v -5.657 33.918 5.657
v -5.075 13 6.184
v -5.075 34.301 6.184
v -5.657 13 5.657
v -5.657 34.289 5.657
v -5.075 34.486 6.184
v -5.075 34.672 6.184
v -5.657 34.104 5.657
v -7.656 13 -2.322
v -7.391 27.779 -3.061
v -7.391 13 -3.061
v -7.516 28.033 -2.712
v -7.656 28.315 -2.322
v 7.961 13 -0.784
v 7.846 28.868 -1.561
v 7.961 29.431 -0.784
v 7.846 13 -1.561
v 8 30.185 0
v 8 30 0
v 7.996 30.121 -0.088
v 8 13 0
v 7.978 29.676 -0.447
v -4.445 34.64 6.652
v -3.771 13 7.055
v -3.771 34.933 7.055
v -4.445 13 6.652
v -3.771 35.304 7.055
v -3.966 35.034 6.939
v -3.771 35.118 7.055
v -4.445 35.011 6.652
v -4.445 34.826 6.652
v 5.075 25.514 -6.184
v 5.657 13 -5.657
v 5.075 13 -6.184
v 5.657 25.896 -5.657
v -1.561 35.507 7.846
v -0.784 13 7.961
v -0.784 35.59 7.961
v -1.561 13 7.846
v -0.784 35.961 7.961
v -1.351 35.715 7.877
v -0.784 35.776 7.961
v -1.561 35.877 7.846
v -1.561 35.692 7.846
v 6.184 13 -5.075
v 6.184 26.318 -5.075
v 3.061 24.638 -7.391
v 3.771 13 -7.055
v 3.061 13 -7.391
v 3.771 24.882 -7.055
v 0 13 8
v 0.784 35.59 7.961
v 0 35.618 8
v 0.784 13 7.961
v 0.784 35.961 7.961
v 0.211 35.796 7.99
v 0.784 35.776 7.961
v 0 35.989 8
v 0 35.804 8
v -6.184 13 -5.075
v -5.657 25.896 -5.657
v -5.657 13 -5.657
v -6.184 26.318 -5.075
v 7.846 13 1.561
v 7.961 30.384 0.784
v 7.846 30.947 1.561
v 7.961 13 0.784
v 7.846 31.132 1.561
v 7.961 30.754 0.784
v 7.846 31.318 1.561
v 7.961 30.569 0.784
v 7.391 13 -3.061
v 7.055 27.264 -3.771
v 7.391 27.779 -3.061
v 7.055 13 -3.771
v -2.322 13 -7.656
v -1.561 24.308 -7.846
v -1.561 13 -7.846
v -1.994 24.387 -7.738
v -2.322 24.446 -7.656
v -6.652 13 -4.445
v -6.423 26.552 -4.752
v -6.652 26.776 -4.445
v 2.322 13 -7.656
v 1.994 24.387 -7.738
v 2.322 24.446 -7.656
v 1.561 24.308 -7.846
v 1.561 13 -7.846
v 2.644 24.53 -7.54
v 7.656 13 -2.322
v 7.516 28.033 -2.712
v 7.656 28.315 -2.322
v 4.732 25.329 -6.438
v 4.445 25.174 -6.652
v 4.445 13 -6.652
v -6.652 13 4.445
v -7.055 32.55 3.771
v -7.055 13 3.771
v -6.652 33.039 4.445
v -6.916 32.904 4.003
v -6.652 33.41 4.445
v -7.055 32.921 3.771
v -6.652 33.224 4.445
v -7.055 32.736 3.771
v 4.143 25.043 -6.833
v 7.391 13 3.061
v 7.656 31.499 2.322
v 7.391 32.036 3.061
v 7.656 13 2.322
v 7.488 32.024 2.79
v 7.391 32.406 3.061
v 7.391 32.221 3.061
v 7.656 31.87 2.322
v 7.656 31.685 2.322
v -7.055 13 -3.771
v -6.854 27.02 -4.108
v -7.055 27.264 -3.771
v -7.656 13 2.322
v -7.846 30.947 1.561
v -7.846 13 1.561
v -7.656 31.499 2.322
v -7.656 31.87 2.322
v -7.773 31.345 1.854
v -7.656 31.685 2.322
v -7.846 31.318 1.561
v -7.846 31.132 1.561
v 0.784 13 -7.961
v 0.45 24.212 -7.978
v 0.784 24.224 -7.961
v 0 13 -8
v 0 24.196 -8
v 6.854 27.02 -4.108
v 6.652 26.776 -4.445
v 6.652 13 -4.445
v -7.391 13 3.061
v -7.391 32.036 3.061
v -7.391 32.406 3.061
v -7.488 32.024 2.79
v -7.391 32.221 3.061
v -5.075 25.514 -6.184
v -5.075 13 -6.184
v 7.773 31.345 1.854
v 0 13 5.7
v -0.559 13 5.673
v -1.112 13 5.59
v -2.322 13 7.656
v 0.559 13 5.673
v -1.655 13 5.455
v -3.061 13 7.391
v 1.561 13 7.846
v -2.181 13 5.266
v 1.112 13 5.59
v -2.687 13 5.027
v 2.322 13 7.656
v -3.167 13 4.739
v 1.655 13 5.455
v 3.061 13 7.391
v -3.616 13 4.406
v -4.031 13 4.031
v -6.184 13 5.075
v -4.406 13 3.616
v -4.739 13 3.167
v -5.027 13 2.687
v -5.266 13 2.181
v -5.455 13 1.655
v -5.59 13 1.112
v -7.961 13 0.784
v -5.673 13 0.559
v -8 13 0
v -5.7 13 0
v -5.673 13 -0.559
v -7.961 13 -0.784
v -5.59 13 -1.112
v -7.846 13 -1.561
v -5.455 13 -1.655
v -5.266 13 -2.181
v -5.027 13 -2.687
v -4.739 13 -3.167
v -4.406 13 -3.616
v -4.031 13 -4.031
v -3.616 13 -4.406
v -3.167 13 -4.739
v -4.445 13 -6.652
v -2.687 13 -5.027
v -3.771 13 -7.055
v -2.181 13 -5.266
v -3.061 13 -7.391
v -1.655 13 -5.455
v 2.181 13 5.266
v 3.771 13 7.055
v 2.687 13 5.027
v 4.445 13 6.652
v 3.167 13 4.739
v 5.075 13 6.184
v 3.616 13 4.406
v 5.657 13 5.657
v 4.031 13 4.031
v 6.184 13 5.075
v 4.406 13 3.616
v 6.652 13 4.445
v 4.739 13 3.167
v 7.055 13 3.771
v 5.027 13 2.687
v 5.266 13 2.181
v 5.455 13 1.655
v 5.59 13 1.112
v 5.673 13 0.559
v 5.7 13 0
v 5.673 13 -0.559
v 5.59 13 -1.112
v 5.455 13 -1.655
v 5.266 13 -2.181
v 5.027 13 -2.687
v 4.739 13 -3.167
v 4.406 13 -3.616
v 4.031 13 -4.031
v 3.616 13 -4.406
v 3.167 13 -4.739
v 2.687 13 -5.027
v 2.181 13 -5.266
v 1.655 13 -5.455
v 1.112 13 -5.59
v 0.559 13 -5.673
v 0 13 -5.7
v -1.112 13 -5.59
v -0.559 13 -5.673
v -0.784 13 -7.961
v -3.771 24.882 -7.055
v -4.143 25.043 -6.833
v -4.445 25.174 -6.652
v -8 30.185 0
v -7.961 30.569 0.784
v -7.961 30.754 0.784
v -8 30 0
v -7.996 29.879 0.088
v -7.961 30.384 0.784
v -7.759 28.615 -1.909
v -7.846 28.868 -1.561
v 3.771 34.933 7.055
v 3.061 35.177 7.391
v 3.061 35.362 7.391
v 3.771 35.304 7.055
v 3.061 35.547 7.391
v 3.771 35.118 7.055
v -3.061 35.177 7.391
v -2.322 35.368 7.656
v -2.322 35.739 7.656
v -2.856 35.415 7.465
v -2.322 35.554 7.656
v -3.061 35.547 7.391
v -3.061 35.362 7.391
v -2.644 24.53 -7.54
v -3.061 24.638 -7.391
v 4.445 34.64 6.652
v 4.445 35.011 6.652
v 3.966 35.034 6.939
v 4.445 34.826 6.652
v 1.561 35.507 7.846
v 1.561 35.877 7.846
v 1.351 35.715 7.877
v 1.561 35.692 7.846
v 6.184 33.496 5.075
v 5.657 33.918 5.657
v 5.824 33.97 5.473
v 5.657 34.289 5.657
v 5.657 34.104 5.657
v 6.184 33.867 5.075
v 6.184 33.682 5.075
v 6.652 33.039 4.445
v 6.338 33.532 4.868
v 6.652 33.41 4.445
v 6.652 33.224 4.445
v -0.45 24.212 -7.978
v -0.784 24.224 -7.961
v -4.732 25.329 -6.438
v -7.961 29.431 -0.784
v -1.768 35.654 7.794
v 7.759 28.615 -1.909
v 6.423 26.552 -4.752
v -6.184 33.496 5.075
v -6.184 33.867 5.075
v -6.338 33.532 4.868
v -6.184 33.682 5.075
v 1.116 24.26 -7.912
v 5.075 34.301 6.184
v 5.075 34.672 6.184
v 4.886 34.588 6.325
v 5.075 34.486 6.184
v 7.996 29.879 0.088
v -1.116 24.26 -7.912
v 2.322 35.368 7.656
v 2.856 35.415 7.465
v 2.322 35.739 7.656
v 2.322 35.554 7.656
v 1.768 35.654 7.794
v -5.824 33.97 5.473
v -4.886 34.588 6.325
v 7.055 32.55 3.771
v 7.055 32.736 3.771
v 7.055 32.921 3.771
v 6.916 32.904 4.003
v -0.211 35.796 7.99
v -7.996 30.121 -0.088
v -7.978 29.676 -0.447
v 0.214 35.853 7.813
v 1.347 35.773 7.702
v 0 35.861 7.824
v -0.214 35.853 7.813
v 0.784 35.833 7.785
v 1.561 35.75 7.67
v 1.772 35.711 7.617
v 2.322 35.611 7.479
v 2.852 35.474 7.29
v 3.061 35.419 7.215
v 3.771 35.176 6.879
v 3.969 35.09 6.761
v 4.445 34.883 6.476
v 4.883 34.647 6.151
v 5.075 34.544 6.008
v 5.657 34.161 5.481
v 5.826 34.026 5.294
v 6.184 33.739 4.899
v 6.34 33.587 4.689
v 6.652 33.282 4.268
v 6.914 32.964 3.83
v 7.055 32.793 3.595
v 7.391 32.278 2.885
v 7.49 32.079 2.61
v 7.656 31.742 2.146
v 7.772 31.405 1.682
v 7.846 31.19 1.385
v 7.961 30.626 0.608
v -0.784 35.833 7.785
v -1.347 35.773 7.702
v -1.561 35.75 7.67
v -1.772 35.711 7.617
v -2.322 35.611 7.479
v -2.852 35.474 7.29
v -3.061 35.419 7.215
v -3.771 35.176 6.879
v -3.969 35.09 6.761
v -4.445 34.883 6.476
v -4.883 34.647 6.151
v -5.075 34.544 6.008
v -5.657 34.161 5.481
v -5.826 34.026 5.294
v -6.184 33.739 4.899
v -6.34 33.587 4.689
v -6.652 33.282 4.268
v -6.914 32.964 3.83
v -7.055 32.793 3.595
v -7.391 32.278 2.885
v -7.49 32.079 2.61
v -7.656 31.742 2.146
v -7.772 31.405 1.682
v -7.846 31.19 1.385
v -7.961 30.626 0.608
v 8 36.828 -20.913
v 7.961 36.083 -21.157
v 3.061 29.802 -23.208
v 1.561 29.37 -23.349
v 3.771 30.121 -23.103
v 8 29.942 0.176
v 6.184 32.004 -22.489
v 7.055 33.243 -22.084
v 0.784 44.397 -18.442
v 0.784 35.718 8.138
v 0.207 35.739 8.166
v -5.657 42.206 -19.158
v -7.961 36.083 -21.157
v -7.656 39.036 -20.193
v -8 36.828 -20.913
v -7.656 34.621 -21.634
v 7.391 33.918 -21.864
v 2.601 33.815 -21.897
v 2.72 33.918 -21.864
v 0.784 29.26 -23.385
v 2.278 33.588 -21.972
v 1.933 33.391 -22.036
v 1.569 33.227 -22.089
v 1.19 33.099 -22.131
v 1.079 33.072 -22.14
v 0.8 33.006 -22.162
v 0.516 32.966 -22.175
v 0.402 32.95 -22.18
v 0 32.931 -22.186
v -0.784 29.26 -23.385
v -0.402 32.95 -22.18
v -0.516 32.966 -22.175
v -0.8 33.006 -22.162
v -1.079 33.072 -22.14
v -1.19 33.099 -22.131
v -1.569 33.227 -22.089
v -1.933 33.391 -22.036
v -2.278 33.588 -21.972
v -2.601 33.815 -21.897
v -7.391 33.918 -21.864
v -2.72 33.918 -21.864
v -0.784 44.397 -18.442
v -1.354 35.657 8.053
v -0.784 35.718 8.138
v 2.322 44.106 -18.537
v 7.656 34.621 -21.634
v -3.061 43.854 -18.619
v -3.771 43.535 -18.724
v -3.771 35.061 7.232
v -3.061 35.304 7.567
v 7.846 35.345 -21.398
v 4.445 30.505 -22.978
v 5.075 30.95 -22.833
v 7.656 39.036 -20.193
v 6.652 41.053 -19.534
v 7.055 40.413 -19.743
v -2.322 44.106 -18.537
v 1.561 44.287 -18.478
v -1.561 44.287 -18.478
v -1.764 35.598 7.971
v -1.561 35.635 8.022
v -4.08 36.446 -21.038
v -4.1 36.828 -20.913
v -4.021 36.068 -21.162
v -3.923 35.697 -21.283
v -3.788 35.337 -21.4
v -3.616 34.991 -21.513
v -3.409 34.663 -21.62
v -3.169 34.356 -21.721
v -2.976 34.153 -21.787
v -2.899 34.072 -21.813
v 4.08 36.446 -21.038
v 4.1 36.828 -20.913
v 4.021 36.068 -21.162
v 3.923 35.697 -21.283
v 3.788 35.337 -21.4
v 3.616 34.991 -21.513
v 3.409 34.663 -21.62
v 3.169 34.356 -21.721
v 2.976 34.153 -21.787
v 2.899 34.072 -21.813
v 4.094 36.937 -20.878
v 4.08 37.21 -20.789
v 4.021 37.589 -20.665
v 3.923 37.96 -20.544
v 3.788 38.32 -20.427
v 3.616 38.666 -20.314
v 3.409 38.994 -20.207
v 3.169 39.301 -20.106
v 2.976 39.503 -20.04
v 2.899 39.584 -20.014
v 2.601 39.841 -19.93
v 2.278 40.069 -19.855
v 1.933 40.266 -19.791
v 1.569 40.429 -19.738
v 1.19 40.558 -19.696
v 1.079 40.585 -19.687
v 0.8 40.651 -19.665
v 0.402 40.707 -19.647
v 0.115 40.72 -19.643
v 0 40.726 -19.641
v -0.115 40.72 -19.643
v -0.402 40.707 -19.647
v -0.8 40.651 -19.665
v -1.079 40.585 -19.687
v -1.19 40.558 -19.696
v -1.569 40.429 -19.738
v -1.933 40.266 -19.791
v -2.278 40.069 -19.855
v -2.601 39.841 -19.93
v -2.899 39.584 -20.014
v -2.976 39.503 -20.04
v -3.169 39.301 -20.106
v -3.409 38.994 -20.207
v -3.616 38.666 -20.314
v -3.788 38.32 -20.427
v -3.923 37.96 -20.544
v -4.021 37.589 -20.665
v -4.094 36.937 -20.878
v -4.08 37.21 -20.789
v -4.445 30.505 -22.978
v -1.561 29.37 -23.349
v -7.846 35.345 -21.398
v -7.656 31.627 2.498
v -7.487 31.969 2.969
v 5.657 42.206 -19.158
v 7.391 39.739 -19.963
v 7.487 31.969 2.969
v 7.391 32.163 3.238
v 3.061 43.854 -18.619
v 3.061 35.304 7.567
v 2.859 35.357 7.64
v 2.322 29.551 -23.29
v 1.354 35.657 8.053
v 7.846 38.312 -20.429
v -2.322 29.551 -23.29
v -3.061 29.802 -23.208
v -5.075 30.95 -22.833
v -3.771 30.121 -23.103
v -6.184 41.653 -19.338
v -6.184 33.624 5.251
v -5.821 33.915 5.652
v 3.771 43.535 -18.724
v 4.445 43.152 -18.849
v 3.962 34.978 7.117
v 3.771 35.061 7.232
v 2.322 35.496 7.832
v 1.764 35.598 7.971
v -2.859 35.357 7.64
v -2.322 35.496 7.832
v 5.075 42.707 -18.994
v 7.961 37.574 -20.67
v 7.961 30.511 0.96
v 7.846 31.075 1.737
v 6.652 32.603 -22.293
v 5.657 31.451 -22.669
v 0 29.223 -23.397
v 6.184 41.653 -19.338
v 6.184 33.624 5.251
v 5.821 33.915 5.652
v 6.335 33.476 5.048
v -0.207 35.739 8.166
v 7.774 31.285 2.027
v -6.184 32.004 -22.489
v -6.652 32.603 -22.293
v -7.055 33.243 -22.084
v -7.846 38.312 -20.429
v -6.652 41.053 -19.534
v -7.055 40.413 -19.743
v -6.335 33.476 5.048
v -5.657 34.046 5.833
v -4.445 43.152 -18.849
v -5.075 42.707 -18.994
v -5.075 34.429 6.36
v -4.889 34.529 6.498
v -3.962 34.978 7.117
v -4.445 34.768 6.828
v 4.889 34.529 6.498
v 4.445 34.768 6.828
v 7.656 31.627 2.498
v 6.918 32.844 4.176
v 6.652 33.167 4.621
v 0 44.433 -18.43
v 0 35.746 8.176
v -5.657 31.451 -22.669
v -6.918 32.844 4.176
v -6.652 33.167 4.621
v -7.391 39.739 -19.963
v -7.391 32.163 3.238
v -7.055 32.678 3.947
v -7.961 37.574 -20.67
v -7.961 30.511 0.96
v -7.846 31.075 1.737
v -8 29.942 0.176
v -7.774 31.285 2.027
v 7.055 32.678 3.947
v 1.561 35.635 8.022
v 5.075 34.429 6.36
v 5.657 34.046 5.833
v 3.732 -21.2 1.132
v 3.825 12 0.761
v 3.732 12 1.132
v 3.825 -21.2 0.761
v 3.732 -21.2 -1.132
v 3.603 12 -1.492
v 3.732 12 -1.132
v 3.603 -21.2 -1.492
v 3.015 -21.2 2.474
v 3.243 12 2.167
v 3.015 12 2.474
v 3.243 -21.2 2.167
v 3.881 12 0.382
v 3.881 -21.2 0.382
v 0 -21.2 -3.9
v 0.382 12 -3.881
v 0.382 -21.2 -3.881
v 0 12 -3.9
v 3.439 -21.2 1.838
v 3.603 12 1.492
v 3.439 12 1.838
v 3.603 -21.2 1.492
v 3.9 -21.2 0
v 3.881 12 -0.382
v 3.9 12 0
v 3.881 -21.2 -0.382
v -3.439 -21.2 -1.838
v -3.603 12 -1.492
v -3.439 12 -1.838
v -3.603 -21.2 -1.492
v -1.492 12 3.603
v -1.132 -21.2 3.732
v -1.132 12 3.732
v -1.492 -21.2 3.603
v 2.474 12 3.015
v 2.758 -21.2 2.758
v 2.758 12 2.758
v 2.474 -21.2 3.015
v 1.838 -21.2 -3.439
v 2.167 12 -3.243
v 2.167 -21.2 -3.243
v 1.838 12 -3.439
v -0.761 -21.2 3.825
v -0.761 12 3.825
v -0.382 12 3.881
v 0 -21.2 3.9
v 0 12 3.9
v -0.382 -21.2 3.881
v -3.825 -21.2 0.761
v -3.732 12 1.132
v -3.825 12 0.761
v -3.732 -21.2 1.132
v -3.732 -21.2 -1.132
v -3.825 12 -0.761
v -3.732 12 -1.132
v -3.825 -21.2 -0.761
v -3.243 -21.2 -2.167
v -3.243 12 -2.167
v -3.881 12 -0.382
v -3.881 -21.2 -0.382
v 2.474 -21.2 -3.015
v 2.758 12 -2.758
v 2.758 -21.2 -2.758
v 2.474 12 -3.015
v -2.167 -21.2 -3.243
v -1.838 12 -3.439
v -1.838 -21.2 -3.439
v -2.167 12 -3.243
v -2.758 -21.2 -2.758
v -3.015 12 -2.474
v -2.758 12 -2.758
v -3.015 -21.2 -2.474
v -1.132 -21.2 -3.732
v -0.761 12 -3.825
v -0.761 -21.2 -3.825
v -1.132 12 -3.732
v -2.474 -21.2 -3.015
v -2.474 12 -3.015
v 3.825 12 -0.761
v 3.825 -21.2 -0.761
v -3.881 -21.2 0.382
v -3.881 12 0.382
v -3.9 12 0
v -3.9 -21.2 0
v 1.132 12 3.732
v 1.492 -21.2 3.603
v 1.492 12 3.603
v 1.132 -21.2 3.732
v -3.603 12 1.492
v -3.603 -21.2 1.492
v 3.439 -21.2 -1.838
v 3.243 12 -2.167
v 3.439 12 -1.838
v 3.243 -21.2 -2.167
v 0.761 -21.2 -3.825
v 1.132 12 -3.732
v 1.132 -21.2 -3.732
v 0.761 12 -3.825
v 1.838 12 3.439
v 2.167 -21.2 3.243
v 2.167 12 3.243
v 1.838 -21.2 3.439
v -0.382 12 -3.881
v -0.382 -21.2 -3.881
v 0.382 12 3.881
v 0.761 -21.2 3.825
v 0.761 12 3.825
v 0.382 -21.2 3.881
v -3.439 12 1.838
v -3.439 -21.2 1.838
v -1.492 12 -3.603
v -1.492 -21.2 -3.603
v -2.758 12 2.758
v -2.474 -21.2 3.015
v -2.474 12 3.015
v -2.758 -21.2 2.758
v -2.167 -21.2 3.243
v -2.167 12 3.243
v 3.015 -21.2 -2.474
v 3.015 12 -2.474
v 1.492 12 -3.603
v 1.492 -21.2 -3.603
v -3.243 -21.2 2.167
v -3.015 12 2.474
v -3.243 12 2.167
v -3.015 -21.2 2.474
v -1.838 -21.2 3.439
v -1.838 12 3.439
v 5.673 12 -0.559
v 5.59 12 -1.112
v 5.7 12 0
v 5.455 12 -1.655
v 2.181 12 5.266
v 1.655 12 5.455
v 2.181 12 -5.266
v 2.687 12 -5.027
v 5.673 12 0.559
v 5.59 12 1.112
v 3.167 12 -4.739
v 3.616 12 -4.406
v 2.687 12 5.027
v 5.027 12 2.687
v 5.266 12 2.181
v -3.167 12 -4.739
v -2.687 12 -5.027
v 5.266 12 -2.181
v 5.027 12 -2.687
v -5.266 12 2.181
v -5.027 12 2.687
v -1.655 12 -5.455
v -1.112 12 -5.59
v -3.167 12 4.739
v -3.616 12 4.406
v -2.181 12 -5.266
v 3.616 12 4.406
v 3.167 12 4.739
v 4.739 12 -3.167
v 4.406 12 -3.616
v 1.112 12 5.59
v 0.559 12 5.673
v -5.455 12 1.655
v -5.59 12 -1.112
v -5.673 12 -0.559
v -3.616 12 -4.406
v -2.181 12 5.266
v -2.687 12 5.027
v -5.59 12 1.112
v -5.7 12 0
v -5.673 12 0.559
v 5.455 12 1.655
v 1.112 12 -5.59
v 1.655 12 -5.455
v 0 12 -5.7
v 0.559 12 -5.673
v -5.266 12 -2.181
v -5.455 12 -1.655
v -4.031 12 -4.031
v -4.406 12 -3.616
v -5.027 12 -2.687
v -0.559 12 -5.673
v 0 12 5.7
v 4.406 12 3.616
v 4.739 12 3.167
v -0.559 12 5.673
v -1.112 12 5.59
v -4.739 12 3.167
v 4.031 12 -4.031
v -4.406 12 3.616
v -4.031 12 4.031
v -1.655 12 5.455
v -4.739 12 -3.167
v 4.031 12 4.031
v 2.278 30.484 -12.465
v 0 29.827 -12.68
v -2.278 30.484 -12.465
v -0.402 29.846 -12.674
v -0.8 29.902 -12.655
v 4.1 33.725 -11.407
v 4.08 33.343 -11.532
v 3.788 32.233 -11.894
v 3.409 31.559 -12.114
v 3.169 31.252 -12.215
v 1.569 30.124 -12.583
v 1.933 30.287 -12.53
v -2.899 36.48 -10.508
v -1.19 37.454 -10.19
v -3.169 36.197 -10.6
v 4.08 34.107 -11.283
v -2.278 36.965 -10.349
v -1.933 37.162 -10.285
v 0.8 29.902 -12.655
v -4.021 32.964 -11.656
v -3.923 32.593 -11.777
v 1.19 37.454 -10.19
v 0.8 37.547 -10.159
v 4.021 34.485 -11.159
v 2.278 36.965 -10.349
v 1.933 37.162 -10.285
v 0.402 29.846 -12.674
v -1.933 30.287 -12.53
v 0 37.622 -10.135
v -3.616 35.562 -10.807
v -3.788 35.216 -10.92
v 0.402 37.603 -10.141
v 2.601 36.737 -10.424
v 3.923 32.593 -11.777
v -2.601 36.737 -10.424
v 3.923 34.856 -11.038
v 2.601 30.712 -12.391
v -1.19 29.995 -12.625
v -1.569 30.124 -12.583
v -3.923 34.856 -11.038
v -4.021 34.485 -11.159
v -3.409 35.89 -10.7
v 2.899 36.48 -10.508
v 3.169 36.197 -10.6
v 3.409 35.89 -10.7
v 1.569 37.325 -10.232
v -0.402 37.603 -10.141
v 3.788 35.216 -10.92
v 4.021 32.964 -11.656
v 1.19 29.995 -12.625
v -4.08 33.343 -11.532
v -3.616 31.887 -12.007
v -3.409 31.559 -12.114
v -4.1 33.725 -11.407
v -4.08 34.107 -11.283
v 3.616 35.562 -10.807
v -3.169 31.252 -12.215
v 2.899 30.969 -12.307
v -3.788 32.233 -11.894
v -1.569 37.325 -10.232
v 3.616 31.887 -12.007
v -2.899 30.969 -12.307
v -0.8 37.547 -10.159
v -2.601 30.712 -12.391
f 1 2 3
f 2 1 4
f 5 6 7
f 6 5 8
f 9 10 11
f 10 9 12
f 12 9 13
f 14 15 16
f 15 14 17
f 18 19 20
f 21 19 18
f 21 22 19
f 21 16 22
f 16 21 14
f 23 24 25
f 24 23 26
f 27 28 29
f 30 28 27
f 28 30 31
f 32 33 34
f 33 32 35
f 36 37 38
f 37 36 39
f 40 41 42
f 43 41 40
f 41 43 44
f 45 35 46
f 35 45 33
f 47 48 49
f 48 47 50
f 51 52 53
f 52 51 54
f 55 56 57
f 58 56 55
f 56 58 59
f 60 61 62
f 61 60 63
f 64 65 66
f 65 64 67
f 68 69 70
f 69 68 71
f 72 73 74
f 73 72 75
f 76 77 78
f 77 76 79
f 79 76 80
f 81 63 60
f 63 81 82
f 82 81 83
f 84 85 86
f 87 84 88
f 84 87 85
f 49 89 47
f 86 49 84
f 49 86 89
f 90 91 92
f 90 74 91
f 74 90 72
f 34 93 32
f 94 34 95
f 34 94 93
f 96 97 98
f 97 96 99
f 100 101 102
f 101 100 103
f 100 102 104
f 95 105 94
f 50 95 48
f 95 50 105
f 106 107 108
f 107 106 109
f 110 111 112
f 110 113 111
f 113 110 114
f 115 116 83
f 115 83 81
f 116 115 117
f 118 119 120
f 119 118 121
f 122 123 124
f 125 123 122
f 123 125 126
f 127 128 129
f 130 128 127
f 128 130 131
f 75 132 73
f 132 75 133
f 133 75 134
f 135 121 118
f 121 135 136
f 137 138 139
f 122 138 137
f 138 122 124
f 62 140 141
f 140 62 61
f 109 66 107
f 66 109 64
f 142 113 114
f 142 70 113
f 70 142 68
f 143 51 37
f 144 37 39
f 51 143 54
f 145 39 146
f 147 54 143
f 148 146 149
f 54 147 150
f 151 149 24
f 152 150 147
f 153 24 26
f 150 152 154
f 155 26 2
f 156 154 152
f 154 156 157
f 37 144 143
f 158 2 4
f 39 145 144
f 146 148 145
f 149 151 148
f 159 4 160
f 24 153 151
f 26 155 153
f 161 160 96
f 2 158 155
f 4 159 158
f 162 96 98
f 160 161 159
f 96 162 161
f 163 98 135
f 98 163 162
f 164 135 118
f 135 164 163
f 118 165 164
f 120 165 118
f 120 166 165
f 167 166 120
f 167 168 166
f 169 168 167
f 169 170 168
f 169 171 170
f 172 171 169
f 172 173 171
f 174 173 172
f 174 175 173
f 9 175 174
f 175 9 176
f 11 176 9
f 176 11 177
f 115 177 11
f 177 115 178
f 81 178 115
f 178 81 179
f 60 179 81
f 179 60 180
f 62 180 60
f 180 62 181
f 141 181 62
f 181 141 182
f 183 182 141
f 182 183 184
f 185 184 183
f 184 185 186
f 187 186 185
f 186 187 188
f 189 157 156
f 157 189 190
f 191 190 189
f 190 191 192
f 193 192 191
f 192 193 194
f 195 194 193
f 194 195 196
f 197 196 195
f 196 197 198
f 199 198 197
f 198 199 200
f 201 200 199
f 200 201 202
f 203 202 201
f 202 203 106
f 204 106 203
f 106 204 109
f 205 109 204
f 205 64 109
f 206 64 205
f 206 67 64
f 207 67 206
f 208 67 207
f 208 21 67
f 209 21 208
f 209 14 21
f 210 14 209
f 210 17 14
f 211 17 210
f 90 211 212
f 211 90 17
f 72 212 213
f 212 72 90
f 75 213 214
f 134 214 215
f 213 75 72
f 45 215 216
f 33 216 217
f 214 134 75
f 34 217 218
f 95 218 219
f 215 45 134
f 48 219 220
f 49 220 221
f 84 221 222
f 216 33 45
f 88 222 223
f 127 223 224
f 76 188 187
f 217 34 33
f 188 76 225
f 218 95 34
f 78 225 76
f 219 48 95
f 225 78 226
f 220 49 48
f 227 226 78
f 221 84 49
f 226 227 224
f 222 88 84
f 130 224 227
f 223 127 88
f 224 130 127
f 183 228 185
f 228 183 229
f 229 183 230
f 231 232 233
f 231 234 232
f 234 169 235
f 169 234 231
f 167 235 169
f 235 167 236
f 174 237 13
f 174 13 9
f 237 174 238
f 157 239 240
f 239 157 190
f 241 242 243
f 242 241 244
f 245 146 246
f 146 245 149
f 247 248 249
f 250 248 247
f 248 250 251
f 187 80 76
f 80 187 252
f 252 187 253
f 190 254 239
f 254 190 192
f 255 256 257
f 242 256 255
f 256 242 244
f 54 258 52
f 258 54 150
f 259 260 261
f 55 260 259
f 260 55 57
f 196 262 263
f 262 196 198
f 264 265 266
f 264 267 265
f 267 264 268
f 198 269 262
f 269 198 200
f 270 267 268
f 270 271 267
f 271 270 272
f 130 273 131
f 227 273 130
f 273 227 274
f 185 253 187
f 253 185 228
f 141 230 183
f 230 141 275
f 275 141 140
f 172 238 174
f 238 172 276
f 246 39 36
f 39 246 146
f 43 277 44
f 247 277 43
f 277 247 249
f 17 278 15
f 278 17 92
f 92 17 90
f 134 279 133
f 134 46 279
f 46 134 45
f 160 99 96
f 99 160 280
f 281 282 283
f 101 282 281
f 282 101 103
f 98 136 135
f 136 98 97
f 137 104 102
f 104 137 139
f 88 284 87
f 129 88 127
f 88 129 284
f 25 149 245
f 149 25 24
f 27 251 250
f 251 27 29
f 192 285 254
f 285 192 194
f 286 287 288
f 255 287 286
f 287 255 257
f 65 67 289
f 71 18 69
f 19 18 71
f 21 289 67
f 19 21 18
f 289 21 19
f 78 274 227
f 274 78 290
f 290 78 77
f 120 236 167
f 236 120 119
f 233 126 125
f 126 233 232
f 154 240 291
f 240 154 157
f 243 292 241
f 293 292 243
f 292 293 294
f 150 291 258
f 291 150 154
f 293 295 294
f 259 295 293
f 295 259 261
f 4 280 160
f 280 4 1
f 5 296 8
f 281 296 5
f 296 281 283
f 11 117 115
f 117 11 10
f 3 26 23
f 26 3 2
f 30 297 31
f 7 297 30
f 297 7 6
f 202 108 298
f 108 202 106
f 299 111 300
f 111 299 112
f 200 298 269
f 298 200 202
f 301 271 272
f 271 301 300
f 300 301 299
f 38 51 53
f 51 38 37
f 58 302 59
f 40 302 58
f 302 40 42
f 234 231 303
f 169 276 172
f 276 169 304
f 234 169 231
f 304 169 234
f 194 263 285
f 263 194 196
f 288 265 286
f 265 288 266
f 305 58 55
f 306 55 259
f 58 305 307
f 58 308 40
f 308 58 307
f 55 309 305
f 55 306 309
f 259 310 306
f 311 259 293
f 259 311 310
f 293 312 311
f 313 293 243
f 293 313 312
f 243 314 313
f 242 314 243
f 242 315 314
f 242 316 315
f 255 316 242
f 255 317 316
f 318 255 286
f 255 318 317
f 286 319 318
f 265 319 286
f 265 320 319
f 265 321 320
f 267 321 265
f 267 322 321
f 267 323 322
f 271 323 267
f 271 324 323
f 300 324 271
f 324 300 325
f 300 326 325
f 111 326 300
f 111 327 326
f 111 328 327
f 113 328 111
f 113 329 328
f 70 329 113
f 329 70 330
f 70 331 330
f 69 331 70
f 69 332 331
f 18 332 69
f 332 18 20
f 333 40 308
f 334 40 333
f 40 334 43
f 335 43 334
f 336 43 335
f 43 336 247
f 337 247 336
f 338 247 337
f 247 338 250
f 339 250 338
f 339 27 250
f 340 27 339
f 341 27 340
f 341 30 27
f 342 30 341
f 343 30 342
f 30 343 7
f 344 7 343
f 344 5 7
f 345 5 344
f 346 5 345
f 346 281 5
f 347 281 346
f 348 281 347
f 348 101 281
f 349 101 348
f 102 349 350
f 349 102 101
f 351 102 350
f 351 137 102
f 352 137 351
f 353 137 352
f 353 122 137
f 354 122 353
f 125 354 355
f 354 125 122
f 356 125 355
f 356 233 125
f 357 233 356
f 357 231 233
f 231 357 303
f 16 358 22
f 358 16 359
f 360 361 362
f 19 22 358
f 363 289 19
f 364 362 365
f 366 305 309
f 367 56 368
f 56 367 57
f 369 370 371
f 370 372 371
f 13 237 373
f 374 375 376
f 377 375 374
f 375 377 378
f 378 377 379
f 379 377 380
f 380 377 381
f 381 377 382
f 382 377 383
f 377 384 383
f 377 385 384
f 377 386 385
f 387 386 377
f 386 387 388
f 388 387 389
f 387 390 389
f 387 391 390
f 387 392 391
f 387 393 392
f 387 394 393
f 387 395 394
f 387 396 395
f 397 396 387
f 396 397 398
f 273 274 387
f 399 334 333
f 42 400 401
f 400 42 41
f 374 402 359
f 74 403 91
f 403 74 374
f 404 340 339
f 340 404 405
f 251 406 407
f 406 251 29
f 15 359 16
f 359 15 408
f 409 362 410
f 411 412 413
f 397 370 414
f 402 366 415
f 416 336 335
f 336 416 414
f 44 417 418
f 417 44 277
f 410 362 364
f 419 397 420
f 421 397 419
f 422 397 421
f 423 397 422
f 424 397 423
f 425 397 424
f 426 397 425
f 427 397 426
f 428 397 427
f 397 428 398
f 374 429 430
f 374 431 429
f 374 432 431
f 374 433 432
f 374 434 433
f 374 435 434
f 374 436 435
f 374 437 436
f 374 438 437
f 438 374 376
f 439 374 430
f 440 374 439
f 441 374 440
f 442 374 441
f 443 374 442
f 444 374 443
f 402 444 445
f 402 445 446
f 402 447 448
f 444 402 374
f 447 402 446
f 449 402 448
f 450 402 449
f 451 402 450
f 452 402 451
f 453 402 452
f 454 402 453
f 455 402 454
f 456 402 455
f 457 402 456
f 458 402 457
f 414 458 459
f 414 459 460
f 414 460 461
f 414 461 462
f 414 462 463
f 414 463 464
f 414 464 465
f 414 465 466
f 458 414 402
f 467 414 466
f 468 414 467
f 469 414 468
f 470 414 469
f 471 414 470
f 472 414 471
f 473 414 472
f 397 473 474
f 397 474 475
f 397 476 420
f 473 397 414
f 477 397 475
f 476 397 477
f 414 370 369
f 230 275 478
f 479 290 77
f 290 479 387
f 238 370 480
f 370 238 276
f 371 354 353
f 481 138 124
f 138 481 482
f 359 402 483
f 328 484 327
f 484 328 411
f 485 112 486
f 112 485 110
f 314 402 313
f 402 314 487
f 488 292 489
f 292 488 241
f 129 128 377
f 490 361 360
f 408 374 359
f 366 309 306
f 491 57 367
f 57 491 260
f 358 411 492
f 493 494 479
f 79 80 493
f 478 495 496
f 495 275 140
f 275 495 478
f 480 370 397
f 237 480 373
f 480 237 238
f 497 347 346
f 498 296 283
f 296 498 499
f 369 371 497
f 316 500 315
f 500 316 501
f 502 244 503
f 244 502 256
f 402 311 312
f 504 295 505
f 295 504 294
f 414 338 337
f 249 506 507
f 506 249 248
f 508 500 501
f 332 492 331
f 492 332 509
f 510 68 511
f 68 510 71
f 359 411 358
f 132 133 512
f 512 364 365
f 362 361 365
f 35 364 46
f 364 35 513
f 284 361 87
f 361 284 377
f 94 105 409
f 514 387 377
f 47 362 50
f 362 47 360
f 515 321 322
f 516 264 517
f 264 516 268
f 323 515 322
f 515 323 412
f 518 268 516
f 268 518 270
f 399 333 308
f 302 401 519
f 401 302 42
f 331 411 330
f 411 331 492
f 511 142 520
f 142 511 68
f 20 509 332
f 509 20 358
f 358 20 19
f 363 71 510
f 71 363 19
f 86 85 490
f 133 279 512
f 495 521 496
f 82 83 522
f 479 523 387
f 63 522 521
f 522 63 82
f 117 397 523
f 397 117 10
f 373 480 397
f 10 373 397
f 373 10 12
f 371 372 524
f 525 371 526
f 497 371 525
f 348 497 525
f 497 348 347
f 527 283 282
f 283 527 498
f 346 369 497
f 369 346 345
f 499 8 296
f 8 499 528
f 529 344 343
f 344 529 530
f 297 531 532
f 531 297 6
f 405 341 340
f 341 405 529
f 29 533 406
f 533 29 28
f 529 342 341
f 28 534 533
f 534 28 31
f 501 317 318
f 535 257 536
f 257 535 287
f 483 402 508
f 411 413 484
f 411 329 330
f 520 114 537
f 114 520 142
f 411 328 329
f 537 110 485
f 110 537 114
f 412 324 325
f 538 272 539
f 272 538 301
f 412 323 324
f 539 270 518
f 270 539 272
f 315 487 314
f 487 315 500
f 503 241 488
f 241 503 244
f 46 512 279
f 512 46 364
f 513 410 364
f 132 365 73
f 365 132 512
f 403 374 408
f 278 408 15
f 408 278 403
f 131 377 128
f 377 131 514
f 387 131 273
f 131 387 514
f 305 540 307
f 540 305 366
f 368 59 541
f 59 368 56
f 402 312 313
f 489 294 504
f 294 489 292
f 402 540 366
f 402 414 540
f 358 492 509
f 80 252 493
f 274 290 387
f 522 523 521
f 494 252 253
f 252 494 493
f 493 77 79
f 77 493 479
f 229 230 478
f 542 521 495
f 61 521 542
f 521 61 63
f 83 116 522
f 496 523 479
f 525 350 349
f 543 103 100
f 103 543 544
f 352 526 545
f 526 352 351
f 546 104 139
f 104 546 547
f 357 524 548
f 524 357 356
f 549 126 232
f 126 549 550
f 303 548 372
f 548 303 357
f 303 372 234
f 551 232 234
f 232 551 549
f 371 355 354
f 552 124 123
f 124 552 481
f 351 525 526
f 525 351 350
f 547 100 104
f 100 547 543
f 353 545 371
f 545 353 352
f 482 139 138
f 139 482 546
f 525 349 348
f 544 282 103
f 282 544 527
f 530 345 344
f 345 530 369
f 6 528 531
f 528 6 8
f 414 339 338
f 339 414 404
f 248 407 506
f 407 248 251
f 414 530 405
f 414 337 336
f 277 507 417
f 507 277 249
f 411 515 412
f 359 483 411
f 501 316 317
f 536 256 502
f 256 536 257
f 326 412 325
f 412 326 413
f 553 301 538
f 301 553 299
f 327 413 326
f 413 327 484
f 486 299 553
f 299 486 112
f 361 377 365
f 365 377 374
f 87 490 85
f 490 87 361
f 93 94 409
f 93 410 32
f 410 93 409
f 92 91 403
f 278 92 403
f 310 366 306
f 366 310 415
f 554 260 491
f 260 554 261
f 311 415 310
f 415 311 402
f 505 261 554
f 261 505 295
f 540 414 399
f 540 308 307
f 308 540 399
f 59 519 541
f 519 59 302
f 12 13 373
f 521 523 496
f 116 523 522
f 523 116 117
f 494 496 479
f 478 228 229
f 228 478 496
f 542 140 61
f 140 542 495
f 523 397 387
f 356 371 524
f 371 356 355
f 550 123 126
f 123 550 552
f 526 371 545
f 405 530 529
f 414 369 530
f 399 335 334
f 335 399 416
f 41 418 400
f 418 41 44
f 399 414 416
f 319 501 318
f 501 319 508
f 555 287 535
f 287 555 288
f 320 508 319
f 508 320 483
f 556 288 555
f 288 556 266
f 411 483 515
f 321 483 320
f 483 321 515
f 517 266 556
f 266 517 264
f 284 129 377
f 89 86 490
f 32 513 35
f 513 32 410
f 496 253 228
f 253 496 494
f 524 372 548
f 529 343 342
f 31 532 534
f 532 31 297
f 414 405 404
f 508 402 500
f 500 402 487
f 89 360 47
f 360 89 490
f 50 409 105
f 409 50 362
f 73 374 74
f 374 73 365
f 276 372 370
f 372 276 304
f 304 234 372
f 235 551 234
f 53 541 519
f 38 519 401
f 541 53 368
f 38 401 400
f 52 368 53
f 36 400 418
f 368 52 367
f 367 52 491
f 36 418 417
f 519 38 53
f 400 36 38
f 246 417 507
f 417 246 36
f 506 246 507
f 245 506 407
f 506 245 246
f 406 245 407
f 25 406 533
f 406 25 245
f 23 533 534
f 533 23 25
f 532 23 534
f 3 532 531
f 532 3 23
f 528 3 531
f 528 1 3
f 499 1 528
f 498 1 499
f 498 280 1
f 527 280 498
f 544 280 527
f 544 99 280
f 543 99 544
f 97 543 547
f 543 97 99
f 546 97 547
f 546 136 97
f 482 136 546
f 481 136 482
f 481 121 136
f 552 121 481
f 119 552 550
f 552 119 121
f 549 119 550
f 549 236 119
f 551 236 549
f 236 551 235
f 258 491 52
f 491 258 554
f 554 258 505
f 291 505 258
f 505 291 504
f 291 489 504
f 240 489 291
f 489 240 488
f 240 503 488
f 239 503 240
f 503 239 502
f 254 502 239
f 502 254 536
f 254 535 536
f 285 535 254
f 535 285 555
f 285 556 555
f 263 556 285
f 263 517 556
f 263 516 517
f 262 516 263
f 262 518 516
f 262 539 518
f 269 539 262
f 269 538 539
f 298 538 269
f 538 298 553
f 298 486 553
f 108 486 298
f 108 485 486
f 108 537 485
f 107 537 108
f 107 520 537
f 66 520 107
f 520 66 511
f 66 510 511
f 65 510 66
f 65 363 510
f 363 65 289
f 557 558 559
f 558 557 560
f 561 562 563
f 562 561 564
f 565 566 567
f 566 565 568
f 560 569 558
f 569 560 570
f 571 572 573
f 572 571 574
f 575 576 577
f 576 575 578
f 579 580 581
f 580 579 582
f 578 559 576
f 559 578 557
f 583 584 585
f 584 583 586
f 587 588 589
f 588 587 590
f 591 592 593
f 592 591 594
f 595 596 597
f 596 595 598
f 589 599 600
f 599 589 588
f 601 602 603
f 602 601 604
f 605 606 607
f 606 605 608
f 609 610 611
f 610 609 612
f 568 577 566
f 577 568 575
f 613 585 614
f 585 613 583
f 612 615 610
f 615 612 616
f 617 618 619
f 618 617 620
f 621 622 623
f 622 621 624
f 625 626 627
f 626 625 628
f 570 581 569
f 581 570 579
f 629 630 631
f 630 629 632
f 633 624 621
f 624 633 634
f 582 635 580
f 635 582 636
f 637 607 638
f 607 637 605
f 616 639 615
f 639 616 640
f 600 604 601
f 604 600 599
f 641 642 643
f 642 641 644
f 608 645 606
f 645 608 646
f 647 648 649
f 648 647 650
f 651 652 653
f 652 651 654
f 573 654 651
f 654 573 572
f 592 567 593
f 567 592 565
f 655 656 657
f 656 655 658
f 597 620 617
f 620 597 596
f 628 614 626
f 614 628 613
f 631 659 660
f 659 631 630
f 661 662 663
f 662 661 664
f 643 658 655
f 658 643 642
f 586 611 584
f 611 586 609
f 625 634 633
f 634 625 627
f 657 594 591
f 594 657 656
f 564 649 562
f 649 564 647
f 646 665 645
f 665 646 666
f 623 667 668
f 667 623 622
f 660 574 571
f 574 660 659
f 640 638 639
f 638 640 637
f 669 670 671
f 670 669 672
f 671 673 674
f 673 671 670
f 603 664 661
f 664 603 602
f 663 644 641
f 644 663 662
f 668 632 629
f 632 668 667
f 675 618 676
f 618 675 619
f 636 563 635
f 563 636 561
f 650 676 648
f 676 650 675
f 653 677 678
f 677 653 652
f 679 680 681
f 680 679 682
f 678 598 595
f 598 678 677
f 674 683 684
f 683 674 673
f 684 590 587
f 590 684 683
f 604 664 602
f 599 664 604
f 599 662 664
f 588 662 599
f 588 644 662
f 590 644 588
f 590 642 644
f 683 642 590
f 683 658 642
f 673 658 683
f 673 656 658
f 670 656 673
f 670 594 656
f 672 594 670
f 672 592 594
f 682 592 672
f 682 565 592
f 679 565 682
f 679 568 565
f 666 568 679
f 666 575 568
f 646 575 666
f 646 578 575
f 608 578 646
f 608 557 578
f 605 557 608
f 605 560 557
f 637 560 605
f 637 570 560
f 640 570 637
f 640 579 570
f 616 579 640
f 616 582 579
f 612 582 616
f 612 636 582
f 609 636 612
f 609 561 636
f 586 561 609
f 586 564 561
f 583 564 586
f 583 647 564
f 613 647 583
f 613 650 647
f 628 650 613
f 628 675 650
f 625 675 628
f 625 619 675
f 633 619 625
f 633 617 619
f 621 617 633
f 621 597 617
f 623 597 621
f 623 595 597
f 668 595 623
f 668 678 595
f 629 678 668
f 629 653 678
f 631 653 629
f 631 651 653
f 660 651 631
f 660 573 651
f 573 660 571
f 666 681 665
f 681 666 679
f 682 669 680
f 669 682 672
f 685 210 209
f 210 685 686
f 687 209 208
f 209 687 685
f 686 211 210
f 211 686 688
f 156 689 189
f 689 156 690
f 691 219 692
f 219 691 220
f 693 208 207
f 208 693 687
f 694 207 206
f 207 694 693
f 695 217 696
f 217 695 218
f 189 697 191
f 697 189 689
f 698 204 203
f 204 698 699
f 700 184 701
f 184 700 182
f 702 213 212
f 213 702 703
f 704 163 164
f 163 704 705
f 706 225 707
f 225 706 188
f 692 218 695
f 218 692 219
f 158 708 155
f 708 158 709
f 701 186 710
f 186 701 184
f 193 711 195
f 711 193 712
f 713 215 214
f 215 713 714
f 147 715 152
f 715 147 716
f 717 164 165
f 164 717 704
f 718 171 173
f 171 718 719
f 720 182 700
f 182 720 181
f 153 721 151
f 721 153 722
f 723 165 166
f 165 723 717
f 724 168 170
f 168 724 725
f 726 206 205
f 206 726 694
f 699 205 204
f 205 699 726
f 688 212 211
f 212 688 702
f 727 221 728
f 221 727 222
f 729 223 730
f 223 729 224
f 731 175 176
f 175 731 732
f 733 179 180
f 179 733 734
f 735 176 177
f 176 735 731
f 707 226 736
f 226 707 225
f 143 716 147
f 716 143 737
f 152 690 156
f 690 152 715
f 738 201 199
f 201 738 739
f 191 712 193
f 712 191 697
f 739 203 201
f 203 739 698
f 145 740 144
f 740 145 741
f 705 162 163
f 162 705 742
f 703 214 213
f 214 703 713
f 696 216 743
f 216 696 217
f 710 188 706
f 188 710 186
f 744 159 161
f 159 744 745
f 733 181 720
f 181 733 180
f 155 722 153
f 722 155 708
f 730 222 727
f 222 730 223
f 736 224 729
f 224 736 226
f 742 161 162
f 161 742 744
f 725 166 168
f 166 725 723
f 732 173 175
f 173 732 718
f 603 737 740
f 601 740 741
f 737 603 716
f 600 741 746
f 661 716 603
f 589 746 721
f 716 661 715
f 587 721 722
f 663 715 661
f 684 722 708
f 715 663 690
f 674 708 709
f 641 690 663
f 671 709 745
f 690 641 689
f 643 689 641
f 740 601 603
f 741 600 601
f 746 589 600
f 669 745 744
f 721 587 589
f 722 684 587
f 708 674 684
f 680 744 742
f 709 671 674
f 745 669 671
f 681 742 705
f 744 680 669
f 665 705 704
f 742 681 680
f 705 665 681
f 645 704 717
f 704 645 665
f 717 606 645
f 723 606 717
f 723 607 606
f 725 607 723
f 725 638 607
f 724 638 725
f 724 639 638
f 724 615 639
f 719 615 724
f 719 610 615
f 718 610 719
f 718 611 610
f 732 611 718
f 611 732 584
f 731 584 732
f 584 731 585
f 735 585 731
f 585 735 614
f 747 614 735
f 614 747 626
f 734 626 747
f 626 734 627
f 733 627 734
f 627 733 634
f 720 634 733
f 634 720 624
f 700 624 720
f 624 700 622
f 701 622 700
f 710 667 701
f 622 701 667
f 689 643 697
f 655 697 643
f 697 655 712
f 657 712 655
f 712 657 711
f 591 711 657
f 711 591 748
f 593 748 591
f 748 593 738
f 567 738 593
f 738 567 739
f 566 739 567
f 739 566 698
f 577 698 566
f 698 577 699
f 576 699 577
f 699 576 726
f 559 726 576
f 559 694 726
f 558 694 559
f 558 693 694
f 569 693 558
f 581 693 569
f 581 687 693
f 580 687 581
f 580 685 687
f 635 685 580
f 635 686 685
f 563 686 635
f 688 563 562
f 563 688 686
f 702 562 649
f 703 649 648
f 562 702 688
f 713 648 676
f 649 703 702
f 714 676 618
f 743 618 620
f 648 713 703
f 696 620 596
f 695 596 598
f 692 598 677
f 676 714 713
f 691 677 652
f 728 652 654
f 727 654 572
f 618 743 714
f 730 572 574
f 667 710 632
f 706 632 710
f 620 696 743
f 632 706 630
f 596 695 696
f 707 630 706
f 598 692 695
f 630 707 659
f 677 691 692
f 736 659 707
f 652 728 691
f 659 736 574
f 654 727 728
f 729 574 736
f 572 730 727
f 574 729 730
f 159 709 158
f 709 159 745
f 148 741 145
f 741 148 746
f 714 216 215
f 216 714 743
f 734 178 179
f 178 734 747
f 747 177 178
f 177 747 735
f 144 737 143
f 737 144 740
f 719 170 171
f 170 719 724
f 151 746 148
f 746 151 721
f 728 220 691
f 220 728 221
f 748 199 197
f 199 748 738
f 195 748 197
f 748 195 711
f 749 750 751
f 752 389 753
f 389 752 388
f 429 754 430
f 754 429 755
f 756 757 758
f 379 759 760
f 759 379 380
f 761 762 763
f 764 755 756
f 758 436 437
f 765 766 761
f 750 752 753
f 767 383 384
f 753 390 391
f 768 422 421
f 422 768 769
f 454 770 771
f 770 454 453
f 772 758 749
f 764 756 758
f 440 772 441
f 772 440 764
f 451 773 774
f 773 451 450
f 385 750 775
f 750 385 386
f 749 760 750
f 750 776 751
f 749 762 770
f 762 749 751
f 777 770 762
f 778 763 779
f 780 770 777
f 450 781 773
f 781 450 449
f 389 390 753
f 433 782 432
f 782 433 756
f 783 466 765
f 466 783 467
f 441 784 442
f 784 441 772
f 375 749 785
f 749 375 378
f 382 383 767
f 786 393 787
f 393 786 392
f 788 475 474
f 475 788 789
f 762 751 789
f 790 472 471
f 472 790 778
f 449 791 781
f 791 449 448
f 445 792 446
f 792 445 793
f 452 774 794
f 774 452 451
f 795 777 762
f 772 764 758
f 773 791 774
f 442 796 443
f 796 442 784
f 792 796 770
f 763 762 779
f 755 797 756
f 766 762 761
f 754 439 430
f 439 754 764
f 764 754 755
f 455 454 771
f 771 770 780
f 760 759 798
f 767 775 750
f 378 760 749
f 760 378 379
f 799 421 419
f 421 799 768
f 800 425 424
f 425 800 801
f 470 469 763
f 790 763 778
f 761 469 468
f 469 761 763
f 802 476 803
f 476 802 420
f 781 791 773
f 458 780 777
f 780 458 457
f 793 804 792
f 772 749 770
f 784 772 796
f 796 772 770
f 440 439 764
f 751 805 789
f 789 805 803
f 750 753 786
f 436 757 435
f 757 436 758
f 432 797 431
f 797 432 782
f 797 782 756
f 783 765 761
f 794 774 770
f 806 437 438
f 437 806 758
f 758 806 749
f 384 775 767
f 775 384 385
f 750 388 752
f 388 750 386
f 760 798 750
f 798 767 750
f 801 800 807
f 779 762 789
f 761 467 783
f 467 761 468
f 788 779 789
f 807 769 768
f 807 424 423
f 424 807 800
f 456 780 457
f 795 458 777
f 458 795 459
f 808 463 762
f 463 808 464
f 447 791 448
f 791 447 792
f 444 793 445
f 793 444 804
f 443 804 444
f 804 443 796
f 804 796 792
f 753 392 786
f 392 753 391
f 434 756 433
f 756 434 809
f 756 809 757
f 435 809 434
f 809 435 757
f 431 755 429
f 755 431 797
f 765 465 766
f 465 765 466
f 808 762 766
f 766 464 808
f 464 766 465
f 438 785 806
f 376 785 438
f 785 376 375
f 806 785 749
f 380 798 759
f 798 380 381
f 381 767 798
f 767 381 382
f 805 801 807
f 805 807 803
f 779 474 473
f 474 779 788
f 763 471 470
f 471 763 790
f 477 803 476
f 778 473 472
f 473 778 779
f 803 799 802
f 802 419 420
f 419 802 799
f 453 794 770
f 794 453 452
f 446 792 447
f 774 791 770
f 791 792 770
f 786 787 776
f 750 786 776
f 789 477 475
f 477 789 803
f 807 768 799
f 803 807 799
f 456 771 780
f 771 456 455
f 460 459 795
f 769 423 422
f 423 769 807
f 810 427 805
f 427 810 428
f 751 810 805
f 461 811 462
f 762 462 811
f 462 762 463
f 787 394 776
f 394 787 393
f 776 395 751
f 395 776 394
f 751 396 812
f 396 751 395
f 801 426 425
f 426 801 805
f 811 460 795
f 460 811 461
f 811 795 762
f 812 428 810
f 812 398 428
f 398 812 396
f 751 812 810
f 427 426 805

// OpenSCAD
// Standalone upper rope socket, FRONT side (short shaft, no encoder).
// v5: unchanged geometry, include moved to frame_v5.scad.

part_mode = "upper_socket";
socket_side = "front";
print_export = true;

include <frame_v5.scad>
